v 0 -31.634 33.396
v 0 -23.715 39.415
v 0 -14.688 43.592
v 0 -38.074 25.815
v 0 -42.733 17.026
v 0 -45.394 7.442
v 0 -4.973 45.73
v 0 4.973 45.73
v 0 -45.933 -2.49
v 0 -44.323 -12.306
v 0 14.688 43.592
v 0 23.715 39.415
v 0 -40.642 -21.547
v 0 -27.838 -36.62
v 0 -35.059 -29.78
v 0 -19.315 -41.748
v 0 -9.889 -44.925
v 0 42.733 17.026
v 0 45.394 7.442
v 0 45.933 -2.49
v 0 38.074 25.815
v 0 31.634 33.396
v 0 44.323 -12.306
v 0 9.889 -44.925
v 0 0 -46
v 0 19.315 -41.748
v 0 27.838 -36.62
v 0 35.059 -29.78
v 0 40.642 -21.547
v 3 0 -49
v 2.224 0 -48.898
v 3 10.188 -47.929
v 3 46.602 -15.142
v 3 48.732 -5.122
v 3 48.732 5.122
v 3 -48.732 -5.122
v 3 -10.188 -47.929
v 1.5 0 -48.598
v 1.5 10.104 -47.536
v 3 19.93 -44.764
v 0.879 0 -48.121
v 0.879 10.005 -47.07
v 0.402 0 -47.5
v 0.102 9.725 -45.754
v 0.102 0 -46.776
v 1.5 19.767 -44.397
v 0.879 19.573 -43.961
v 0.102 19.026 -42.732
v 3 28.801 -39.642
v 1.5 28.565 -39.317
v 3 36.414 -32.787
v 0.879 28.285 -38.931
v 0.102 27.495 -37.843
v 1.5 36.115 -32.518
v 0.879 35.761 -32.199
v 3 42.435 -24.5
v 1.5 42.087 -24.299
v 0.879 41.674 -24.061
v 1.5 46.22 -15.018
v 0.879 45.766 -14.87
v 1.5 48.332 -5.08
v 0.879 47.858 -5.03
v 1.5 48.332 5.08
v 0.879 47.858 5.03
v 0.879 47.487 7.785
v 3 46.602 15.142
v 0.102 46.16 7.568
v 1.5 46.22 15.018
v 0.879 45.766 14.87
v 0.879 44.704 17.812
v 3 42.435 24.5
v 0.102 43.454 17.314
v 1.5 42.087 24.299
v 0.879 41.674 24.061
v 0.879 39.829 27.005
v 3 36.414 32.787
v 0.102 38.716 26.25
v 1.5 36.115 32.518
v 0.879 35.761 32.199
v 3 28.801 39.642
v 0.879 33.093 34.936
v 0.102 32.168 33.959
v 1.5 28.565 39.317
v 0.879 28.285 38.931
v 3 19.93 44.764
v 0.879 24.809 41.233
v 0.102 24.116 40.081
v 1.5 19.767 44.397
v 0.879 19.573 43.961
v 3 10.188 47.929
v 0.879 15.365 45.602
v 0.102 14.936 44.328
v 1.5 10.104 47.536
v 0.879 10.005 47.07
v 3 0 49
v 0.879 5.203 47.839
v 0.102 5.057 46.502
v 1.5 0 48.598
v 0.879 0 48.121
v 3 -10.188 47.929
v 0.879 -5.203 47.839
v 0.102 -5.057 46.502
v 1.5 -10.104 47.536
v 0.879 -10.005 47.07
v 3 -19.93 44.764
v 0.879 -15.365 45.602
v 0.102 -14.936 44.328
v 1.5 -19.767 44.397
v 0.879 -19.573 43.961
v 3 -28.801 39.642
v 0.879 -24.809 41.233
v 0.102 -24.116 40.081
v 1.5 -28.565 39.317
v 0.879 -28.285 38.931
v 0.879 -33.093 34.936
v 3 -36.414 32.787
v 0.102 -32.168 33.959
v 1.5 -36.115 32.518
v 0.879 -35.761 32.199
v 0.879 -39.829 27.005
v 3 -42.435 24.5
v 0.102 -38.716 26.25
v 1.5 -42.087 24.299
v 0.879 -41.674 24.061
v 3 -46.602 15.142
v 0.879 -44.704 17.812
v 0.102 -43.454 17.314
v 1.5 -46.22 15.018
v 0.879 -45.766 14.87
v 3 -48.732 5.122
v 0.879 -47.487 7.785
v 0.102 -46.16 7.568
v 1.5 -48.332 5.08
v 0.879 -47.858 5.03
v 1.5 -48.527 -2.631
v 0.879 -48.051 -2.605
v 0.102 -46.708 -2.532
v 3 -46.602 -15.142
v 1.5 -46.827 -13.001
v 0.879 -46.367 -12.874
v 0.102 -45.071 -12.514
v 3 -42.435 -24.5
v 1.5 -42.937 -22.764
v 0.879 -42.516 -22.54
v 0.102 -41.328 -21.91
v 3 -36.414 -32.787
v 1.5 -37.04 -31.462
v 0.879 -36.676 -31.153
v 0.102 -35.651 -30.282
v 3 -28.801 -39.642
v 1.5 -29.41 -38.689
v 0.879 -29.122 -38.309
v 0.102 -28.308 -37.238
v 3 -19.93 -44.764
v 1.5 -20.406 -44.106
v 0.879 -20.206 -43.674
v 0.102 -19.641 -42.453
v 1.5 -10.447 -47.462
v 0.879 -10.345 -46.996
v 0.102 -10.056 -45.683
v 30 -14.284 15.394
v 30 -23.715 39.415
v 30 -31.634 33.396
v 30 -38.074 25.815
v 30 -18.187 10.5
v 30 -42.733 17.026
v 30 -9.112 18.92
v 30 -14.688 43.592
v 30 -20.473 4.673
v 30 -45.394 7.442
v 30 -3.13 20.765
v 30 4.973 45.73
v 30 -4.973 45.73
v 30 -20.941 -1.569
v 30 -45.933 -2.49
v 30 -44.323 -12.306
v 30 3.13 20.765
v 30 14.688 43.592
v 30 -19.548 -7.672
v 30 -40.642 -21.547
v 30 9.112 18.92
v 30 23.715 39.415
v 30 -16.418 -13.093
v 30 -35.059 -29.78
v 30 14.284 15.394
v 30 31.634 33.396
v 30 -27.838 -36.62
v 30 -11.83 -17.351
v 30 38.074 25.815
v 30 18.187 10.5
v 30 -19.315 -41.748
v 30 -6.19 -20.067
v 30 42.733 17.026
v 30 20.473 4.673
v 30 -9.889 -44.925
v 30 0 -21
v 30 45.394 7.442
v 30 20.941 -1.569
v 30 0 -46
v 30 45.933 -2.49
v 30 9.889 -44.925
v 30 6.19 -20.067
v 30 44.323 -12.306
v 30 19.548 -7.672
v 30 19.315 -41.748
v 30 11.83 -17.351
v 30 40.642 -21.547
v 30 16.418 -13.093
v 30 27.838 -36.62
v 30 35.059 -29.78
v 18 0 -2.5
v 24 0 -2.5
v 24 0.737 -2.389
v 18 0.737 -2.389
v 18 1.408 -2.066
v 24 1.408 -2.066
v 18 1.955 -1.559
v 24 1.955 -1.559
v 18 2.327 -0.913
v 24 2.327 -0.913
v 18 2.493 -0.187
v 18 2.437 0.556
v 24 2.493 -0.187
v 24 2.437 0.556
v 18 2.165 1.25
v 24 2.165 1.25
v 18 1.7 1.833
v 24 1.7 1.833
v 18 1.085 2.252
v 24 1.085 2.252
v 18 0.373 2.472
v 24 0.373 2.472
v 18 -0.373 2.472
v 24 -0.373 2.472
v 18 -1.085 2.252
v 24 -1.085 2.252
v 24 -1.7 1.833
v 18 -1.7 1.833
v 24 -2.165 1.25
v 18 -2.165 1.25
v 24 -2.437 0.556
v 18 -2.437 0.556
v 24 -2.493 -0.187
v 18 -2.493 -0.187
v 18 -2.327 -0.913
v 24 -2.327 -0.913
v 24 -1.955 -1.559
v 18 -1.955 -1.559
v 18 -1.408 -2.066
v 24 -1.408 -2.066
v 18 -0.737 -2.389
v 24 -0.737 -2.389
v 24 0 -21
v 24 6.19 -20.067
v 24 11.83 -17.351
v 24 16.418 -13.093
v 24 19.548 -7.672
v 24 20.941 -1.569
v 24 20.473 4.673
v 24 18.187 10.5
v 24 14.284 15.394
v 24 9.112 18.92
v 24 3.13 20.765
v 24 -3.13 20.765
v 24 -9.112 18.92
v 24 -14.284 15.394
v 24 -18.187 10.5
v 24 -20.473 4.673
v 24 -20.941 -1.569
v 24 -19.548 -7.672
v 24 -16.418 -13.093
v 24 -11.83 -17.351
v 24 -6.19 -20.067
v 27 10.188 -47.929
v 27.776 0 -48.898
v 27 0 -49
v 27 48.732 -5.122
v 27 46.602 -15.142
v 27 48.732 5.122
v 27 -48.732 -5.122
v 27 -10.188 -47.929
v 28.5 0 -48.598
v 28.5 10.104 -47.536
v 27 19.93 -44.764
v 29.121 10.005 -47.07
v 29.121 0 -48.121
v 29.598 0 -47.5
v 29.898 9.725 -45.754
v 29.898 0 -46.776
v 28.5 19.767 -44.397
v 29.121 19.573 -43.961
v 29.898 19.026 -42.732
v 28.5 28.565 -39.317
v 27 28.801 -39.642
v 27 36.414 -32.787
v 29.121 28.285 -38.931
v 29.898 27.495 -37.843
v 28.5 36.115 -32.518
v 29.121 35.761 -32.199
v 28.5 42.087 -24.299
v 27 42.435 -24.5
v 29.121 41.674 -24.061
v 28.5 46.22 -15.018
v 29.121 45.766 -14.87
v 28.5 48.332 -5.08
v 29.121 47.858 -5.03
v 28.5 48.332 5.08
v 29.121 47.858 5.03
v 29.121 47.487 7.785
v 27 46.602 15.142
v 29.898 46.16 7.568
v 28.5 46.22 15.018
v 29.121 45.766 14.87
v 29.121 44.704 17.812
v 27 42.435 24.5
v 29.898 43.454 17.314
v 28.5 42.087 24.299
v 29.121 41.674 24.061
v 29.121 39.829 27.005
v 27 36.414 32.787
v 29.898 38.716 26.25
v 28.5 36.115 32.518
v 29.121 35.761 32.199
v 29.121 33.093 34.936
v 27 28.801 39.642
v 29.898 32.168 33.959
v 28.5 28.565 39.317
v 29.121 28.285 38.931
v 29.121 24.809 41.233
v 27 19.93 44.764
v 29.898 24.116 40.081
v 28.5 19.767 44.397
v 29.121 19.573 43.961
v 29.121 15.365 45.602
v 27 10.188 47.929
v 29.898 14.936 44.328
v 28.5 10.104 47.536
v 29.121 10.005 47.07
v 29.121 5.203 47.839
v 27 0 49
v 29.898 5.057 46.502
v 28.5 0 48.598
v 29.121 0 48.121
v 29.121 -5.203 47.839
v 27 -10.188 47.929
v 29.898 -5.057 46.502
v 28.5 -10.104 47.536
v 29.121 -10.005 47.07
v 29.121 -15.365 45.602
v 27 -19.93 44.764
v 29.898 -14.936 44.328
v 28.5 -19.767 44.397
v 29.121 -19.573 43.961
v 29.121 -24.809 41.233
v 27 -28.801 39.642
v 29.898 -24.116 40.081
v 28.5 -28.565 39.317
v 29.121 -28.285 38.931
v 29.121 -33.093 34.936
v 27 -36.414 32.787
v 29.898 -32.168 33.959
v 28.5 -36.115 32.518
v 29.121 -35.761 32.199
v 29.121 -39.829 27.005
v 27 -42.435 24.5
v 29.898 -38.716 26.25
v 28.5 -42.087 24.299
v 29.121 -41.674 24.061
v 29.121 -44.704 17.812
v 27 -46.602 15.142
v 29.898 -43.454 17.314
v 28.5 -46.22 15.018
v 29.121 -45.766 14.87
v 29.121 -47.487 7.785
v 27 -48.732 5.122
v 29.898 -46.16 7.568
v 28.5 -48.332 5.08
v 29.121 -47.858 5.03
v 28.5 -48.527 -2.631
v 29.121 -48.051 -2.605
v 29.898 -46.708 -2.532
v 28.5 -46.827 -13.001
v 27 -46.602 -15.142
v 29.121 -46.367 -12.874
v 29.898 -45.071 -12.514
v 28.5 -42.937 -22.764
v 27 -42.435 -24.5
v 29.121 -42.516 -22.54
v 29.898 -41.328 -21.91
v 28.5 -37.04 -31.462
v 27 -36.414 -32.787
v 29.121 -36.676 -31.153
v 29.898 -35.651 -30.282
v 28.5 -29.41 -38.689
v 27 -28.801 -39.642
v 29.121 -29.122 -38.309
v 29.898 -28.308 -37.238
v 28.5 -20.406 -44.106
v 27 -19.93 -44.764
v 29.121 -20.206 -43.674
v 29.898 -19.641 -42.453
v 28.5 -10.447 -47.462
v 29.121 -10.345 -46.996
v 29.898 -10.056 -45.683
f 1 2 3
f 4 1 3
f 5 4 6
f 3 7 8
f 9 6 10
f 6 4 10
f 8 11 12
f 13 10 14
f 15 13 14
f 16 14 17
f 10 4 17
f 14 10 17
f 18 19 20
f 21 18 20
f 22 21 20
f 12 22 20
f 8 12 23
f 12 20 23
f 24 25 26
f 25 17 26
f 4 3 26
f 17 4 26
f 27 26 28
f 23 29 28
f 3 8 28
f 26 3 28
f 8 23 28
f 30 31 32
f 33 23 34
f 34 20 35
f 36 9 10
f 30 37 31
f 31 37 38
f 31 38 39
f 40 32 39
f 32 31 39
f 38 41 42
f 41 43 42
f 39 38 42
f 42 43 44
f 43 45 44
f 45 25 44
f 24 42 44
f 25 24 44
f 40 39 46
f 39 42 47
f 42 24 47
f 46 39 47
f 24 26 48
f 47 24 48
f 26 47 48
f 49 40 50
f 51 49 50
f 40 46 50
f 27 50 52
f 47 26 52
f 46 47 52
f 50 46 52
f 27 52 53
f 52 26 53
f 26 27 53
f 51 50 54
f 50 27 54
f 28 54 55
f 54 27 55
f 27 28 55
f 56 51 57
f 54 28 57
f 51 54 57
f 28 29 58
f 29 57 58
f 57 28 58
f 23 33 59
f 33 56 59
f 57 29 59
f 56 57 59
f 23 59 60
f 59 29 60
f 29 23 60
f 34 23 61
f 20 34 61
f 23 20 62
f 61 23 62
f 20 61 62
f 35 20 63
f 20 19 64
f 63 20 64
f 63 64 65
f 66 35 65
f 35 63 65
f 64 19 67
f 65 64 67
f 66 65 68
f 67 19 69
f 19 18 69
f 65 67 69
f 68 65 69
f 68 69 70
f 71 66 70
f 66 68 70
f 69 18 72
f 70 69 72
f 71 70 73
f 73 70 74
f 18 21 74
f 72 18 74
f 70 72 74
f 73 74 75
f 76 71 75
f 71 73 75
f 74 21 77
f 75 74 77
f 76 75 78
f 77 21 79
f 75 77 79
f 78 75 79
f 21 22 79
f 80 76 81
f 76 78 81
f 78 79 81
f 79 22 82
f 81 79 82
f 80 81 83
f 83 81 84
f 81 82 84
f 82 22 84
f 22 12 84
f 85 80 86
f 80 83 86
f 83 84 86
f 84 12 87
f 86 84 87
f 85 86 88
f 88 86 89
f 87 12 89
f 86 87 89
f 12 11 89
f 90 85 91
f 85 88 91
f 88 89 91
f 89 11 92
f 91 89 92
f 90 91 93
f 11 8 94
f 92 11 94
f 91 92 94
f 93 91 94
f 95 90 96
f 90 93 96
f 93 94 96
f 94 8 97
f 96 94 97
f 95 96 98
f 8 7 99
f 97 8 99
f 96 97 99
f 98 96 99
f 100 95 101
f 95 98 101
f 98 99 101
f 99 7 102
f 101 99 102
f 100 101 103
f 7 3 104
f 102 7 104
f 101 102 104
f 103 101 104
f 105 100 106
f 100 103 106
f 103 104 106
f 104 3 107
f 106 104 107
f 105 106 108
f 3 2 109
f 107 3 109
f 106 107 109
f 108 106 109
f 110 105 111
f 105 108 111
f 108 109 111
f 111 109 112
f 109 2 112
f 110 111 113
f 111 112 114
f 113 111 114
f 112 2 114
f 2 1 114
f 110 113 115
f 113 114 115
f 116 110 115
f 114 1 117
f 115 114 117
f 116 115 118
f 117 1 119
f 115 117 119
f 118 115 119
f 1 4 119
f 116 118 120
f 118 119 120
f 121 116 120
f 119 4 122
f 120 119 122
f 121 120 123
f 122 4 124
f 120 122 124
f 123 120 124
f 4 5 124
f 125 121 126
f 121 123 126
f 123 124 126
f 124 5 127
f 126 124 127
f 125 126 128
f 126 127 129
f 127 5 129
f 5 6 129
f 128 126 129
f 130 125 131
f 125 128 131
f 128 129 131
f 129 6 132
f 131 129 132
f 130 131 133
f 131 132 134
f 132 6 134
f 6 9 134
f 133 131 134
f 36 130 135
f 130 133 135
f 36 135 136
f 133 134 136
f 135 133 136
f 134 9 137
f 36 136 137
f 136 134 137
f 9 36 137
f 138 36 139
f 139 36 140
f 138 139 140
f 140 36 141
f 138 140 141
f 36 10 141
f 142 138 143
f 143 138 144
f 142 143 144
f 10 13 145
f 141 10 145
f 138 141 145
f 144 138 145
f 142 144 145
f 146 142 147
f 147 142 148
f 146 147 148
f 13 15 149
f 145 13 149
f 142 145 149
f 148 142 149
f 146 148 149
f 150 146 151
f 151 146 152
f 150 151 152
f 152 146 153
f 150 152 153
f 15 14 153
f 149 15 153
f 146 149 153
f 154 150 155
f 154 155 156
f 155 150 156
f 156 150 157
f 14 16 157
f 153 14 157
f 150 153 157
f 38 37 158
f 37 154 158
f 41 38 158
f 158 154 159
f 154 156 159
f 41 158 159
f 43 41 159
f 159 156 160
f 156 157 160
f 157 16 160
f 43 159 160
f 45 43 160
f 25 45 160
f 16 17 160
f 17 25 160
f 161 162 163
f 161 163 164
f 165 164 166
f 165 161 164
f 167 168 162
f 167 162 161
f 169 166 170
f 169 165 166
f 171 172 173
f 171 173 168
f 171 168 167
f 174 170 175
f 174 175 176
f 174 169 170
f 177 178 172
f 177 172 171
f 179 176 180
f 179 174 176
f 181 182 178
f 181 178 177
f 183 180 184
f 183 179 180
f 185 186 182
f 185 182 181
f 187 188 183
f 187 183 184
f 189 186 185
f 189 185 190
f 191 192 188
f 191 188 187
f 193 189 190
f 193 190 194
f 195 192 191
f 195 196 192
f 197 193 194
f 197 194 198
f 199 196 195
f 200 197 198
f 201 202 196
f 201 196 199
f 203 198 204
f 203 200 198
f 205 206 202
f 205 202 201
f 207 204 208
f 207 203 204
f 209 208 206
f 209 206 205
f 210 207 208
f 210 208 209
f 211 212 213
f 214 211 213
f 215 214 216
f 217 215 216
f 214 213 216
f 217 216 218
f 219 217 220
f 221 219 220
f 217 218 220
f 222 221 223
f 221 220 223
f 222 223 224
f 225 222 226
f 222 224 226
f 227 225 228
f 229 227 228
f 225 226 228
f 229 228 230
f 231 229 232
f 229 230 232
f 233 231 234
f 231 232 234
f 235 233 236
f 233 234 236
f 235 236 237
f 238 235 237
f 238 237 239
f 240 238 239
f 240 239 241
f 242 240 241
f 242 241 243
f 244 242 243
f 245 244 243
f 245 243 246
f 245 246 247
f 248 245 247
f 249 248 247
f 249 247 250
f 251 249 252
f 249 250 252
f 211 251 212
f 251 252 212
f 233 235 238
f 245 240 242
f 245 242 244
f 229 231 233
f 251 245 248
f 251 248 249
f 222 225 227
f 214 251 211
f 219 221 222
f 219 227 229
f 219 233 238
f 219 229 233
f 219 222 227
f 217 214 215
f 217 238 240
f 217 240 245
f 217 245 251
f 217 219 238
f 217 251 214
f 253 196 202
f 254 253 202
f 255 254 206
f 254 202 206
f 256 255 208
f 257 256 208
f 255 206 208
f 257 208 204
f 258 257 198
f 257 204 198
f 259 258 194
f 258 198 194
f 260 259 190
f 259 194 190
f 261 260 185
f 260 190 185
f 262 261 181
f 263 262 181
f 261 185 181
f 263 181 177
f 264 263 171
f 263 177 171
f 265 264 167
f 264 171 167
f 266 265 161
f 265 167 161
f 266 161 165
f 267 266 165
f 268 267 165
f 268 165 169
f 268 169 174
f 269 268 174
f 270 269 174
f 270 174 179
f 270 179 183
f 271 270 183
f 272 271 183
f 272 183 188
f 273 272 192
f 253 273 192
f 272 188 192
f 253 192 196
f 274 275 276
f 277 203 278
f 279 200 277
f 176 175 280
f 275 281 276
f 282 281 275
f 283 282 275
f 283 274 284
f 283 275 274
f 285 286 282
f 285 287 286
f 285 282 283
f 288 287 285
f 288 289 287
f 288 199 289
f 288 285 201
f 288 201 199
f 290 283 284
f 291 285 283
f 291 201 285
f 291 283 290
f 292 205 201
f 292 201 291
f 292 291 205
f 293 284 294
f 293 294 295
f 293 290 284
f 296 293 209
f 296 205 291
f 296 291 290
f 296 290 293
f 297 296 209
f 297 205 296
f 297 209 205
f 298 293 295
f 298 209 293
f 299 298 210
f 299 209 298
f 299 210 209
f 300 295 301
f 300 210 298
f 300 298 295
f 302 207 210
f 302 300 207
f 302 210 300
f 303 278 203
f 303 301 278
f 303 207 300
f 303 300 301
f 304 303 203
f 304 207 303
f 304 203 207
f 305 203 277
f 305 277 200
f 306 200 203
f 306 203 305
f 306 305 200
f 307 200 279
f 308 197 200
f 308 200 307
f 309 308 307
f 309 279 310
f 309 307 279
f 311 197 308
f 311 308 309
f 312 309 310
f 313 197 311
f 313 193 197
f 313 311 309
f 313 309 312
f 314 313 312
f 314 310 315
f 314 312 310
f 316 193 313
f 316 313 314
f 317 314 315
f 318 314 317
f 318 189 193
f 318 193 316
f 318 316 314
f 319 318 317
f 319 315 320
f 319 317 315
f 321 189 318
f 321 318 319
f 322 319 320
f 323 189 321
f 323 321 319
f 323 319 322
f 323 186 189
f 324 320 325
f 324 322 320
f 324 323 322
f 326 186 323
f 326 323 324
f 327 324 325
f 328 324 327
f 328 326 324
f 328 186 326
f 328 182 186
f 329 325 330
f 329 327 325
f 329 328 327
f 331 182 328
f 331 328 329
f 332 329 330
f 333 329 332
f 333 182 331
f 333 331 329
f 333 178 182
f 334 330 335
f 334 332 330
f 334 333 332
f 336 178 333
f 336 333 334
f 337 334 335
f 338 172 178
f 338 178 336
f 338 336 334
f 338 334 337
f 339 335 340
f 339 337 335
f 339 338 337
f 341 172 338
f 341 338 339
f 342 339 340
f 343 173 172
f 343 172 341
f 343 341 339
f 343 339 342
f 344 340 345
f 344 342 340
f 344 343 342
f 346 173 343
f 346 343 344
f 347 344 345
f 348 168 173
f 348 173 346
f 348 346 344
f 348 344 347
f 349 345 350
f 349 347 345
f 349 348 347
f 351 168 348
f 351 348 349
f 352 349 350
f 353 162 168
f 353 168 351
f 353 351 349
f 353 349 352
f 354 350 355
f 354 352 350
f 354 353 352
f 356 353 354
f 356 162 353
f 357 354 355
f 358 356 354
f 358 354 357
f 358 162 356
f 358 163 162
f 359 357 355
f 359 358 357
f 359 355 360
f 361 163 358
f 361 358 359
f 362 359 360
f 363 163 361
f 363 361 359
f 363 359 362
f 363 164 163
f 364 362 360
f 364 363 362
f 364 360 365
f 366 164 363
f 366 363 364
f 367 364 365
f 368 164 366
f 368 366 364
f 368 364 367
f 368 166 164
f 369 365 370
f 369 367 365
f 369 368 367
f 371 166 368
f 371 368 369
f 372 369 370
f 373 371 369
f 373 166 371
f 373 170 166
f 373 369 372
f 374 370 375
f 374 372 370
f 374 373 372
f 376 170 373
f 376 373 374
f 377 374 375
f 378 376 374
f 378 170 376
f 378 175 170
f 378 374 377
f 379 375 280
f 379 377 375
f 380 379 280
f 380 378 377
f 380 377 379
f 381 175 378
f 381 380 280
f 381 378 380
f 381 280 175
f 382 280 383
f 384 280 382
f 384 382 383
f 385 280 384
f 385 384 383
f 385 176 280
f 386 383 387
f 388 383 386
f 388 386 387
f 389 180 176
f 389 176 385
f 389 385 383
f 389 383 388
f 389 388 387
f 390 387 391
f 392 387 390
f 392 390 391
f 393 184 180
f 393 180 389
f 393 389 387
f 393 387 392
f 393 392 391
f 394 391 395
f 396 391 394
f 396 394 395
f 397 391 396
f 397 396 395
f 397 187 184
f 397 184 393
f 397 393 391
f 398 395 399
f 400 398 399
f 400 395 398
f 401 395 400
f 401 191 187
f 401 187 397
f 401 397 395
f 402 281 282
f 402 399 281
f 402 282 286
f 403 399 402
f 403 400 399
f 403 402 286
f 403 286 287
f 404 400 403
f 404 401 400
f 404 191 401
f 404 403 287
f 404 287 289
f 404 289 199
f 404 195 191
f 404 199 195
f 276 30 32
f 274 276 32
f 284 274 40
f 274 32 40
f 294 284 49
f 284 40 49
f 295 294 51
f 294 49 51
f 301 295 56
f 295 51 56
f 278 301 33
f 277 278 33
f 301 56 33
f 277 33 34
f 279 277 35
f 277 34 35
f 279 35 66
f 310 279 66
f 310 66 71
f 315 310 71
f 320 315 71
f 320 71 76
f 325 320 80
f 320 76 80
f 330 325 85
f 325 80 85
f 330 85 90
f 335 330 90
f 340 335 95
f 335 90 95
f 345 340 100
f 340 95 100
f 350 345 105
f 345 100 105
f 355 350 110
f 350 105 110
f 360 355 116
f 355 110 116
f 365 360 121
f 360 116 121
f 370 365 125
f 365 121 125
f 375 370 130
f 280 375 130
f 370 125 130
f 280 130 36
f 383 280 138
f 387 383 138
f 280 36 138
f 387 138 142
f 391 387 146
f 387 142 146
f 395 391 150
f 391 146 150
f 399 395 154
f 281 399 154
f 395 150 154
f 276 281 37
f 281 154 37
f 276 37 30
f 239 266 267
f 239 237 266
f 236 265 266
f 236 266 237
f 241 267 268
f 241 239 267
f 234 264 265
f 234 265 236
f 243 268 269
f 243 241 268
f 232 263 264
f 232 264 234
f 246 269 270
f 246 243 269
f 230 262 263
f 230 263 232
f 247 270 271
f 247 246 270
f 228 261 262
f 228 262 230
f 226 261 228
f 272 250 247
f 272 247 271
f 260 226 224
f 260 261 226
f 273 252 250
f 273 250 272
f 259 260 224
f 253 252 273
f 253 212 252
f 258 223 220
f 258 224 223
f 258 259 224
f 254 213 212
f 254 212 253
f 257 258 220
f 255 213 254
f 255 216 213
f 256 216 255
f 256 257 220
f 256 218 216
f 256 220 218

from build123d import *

# Parameters (mm, degrees)
SKETCH_1_R          = 49
EXTRUDE_1_DEPTH     = 30
FILLET_1_R          = 3
SKETCH_2_R          = 21
CUT_EXTRUDE_1_DEPTH = 6
SKETCH_3_R          = 2.5
CUT_EXTRUDE_2_DEPTH = 6


with BuildPart() as part:
    # 草图1 → 凸台-拉伸1 (new body)
    with BuildSketch(Plane(origin=(0, 0, 0), x_dir=(0, 0, -1), z_dir=(1, 0, 0))):
        Circle(SKETCH_1_R)
    extrude(amount=EXTRUDE_1_DEPTH)

    # 圆角1
    fillet_1_edges = [part.edges().sort_by_distance(p)[0] for p in [
        (0, 0, 49),
        (30, 0, 49),
    ]]
    fillet(fillet_1_edges, radius=FILLET_1_R)

    # 草图2 → 切除-拉伸1 (cut)
    with BuildSketch(Plane(origin=(30, 0, 0), x_dir=(0, 0, -1), z_dir=(1, 0, 0))):
        Circle(SKETCH_2_R)
    extrude(amount=-CUT_EXTRUDE_1_DEPTH, mode=Mode.SUBTRACT)

    # 草图3 → 切除-拉伸2 (cut)
    with BuildSketch(Plane(origin=(24, 0, 0), x_dir=(0, 0, -1), z_dir=(1, 0, 0))):
        Circle(SKETCH_3_R)
    extrude(amount=-CUT_EXTRUDE_2_DEPTH, mode=Mode.SUBTRACT)


solid = part.part
